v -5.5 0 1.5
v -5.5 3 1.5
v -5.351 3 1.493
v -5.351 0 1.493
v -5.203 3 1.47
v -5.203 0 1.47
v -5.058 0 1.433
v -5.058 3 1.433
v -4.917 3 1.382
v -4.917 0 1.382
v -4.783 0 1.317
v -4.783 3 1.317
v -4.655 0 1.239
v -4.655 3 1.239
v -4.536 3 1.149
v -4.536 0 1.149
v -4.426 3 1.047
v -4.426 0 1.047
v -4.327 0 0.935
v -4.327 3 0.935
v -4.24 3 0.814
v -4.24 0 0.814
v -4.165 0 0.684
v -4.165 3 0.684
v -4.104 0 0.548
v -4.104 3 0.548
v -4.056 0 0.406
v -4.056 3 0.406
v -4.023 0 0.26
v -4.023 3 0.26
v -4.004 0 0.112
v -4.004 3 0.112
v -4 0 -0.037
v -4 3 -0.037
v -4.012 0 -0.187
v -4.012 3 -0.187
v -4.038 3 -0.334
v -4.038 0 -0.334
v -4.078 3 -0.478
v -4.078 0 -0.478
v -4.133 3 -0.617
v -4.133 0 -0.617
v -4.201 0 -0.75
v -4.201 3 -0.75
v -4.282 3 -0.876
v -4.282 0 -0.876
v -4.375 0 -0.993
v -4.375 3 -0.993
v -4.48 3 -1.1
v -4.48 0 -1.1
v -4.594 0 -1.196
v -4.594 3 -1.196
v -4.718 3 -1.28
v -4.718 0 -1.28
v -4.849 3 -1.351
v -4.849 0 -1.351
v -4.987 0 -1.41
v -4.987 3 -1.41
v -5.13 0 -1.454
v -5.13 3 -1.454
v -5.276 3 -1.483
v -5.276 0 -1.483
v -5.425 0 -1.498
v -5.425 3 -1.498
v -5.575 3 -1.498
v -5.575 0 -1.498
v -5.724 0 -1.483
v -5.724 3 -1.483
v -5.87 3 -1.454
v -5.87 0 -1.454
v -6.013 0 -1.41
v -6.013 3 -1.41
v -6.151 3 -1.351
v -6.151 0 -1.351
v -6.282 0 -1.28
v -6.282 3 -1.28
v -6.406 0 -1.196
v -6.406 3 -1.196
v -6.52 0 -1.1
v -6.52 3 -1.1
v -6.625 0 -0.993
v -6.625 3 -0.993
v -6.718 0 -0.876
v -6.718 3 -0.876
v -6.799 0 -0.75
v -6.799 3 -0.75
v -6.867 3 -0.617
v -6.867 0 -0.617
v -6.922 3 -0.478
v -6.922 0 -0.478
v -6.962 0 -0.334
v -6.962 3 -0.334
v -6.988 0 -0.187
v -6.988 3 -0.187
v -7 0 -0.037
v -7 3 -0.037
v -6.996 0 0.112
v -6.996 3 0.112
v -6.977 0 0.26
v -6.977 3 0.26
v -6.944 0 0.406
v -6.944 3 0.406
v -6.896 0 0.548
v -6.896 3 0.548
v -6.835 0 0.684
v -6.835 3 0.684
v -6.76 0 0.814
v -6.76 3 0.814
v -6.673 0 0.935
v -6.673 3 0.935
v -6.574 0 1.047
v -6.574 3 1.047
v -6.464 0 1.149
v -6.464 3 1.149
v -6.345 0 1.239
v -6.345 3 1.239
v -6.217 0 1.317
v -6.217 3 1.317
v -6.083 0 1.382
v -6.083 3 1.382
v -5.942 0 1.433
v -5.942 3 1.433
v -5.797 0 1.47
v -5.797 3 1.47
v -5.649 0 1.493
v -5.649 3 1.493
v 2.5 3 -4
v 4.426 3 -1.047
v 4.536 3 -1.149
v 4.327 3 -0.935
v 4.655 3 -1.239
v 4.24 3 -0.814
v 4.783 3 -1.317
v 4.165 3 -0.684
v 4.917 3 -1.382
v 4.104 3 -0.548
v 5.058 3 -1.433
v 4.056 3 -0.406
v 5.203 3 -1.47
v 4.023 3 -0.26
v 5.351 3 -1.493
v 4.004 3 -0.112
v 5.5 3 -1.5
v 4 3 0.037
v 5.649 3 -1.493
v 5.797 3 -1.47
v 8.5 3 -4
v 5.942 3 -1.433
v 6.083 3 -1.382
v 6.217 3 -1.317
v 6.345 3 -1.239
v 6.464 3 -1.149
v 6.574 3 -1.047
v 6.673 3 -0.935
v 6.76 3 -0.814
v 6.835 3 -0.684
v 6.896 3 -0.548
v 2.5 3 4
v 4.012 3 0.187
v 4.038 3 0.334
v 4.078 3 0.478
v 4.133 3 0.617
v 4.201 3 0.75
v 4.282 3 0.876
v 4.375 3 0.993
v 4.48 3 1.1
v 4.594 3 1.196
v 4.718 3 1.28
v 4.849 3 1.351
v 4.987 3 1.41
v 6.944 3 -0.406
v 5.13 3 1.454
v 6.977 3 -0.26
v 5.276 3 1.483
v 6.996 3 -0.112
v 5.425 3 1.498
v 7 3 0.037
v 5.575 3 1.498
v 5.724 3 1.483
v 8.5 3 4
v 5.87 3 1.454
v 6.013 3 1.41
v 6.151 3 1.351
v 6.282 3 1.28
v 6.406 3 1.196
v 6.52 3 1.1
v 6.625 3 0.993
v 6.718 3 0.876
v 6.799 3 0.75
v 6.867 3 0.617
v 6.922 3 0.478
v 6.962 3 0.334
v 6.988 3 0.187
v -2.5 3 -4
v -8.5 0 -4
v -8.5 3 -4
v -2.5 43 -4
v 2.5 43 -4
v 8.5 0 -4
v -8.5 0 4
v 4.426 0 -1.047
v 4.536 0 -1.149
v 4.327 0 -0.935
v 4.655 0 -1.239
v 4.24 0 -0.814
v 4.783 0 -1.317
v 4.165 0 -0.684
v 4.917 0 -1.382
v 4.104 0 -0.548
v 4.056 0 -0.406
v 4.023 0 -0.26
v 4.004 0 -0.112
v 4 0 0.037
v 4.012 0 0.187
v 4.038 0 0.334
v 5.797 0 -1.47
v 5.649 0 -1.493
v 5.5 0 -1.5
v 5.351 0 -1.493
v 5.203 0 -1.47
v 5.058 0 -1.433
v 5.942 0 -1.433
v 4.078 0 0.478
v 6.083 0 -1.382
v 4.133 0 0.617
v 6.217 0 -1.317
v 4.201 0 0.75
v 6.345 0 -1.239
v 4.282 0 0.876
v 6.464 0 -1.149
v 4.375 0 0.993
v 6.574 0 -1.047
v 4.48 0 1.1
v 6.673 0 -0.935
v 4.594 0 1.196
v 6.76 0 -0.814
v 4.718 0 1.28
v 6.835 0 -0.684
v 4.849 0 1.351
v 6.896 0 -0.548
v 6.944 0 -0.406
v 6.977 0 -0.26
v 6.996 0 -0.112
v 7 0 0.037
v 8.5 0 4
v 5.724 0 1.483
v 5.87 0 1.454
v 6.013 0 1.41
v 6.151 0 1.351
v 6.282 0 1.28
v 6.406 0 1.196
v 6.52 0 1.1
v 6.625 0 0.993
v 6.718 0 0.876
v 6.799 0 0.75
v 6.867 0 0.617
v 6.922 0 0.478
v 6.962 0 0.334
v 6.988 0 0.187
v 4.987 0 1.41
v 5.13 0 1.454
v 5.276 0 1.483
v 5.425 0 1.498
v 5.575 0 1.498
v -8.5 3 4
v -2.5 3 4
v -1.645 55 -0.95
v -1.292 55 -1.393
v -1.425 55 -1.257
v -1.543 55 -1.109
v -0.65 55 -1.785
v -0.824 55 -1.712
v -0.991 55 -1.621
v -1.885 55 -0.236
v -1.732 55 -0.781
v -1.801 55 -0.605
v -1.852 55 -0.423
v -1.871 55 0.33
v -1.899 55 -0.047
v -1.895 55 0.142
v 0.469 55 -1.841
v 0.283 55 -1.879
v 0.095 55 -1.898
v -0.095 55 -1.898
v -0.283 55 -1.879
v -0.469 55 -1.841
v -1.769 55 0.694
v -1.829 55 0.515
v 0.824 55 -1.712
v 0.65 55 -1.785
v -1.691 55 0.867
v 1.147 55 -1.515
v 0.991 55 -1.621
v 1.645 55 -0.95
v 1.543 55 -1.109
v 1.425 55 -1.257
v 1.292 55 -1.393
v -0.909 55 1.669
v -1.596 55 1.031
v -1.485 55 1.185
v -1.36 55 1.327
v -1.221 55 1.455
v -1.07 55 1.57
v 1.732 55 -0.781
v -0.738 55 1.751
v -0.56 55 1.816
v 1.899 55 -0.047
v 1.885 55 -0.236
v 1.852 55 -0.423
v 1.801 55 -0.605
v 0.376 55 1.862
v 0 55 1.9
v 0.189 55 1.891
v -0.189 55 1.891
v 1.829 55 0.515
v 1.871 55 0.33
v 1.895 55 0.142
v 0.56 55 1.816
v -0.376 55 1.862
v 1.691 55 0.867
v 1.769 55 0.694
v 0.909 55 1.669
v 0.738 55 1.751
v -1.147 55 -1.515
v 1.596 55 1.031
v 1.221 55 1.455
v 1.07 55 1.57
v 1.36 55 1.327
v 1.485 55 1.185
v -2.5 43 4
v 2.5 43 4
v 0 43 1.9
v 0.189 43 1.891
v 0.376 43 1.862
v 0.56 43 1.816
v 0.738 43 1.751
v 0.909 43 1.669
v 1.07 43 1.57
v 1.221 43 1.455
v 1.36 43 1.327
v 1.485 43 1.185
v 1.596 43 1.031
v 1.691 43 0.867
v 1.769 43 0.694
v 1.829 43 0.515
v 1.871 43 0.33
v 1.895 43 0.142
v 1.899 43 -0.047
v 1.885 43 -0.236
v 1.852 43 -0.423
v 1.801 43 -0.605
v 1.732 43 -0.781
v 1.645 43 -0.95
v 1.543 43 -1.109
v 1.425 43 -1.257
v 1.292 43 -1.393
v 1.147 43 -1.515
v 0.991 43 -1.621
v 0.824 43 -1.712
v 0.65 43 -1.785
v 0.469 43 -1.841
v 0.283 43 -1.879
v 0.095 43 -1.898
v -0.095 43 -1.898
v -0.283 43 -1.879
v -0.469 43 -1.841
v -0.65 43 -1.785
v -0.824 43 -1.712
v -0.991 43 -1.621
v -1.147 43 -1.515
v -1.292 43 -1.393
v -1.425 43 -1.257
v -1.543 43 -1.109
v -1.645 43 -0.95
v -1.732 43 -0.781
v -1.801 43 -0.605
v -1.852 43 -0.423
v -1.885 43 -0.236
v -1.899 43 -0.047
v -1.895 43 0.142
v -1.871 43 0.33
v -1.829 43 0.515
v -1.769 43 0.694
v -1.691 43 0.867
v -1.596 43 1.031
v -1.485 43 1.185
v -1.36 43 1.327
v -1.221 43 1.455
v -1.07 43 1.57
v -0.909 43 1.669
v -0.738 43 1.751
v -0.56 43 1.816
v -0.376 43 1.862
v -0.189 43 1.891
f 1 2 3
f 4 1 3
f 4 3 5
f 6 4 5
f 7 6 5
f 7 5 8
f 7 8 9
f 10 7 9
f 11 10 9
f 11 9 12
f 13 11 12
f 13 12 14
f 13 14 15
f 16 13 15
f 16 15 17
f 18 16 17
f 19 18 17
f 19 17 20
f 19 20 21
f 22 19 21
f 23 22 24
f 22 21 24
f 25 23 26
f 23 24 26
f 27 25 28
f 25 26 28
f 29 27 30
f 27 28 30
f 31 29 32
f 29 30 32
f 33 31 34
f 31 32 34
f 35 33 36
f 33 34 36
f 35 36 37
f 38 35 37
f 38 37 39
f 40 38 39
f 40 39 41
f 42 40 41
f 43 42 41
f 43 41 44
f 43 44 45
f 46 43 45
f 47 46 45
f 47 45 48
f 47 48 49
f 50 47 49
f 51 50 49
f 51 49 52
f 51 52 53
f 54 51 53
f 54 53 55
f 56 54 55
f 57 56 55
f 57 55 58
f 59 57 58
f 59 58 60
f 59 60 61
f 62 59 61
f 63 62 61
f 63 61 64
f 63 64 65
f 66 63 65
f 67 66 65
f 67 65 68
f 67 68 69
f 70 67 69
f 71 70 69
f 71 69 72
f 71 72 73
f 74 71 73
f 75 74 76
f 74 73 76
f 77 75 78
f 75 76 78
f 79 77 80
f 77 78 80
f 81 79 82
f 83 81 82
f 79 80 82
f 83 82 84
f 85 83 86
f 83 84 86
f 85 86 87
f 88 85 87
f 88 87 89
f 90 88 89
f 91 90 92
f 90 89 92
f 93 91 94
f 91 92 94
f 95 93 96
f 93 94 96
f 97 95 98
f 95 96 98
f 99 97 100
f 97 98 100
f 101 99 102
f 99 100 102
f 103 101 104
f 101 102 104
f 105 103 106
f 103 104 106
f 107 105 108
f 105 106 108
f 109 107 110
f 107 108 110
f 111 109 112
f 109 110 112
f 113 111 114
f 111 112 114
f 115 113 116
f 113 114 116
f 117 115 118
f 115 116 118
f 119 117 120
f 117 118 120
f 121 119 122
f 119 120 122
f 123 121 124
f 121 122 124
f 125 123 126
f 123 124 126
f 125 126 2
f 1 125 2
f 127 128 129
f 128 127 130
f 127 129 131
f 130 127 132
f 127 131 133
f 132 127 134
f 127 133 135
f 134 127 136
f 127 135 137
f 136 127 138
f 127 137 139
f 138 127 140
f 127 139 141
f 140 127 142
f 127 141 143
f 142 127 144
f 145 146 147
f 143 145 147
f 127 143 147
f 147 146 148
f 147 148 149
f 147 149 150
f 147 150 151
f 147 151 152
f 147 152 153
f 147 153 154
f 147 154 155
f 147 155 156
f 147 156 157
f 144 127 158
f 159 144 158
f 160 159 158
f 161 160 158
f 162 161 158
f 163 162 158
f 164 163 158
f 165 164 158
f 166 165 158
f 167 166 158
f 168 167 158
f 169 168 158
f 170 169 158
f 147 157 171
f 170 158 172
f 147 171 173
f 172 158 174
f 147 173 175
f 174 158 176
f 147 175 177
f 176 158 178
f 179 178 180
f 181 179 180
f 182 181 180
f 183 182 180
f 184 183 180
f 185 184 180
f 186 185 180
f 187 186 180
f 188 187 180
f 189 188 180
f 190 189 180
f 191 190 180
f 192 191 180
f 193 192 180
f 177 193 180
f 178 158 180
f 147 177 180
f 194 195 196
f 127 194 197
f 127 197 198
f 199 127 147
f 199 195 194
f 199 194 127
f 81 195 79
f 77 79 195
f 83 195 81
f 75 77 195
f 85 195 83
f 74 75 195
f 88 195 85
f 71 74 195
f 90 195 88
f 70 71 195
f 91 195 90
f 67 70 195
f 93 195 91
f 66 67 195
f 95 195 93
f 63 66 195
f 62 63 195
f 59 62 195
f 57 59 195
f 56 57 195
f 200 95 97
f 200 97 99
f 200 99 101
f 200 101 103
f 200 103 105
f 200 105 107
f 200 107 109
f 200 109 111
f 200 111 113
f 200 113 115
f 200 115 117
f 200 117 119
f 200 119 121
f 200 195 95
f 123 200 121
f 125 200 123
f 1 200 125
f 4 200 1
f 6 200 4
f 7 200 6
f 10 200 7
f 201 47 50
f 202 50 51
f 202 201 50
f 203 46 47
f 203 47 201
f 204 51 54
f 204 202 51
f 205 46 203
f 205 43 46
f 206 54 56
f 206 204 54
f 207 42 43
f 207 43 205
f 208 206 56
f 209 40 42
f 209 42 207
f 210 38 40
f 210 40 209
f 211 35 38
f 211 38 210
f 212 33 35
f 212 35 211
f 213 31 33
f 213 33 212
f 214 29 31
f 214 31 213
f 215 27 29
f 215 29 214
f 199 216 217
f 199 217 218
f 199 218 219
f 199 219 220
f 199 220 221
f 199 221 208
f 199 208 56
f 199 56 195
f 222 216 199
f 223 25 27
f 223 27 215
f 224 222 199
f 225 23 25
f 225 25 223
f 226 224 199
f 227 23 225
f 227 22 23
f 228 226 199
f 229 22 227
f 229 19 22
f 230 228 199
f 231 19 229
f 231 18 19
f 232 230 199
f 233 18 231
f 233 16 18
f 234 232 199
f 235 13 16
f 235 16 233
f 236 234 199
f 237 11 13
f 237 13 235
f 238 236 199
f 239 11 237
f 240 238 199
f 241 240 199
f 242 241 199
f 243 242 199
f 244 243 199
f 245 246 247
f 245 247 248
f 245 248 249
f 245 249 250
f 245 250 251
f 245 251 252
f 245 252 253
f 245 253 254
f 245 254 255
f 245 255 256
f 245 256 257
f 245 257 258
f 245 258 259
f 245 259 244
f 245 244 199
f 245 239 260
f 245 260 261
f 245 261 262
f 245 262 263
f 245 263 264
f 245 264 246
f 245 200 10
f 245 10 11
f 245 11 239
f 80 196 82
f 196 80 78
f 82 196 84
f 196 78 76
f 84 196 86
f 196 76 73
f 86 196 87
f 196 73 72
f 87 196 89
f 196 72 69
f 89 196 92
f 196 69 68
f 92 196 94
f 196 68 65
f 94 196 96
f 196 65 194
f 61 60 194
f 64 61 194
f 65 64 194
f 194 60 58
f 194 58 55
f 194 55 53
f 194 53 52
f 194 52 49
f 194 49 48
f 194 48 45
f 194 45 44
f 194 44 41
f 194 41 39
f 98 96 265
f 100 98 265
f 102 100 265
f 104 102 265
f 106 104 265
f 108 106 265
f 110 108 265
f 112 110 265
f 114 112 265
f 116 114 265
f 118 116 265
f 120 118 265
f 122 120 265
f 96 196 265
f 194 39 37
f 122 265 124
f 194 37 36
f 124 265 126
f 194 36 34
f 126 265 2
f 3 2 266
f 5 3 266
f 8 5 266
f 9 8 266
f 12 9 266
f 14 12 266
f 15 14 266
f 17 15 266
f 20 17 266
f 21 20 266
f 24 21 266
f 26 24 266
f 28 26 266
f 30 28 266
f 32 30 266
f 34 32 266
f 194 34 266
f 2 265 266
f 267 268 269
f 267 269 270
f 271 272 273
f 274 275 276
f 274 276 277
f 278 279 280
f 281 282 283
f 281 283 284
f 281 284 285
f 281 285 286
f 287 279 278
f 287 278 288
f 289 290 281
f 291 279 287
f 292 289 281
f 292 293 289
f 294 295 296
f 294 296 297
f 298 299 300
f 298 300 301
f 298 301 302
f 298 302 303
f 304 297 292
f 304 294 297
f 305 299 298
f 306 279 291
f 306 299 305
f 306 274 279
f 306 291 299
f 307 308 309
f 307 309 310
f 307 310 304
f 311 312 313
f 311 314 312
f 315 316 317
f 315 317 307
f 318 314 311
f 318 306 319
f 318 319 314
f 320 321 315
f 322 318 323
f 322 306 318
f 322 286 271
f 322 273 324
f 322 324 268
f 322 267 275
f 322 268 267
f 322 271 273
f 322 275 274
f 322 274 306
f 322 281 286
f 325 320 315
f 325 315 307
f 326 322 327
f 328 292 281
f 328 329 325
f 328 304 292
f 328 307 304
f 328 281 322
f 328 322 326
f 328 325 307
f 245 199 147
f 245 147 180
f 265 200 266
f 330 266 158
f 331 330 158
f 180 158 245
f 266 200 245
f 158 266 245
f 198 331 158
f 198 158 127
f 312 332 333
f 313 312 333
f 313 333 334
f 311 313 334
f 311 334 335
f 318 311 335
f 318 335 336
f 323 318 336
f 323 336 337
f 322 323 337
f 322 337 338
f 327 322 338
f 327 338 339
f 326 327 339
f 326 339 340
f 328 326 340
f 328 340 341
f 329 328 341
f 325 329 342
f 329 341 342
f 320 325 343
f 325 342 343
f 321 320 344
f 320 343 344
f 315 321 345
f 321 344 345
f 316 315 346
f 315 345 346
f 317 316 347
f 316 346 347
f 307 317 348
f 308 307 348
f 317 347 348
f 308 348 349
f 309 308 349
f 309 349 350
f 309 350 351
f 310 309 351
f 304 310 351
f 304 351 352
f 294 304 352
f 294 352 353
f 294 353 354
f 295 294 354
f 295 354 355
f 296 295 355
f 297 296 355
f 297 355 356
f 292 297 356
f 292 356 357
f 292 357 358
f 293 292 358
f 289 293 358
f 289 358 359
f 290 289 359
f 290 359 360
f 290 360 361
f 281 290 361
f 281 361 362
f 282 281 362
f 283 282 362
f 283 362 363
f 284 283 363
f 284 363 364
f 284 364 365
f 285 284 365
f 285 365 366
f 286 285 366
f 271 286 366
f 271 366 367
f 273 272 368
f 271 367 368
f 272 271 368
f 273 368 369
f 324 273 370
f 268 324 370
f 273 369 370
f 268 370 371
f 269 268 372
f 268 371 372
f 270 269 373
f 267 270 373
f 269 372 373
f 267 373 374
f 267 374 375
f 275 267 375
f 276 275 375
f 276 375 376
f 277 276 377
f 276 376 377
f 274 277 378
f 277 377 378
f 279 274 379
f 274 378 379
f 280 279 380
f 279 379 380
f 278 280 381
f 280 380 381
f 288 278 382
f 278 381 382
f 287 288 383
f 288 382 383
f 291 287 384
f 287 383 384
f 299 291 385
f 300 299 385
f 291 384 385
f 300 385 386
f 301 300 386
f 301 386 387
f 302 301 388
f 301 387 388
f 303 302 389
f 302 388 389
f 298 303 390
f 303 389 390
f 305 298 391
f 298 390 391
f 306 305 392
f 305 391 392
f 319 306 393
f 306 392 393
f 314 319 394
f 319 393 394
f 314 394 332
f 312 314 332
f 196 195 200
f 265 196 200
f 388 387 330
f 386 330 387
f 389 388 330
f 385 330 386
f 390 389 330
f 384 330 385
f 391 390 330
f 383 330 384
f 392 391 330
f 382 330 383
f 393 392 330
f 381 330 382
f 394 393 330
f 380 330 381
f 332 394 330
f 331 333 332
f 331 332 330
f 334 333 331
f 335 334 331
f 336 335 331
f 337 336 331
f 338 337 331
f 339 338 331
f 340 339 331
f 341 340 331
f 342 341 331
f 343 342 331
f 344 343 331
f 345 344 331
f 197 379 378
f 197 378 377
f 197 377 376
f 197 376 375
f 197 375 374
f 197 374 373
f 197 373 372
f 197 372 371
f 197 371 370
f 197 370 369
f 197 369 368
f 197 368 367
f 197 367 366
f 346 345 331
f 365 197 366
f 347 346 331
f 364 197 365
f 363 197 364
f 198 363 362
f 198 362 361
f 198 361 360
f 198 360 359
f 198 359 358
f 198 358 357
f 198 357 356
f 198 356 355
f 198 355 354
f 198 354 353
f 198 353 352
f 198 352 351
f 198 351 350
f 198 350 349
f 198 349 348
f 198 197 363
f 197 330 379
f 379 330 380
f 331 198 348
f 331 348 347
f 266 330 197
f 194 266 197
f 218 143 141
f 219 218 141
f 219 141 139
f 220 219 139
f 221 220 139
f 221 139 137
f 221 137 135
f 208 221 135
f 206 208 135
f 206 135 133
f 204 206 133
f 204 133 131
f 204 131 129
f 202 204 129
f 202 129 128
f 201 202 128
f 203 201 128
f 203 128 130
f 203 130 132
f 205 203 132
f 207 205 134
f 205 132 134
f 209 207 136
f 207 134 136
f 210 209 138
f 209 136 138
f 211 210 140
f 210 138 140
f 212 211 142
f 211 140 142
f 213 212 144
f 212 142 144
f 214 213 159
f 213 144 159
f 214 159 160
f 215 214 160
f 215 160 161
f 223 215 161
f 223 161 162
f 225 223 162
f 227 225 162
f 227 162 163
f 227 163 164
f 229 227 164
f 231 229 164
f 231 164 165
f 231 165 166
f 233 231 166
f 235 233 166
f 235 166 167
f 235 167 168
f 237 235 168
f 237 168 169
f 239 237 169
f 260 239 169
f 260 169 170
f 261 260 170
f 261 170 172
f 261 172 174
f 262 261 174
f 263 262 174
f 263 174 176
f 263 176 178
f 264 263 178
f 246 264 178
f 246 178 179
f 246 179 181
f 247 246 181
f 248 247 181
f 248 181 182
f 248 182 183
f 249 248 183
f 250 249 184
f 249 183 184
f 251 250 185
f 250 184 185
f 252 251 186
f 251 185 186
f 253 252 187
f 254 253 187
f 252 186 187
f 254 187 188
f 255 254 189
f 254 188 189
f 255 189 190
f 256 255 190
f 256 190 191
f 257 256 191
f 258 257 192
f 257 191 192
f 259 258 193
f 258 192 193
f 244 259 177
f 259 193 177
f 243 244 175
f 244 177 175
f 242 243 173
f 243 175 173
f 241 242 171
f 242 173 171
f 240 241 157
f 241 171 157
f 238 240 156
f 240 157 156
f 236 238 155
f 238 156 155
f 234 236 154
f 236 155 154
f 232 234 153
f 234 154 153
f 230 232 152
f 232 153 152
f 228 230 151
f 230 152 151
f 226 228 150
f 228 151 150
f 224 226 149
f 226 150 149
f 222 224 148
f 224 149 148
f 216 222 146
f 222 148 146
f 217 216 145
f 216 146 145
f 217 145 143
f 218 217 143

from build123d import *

# Parameters (mm, degrees)
SKETCH1_R           = 1.9
BOSS_EXTRUDE1_DEPTH = 55
SKETCH2_W           = 17
SKETCH2_H           = 8
BOSS_EXTRUDE2_DEPTH = 3
SKETCH3_R           = 1.5
CUT_EXTRUDE1_DEPTH  = 53.841744861
SKETCH4_W           = 5
SKETCH4_H           = 8
BOSS_EXTRUDE3_DEPTH = 40


with BuildPart() as part:
    # Sketch1 → Boss-Extrude1 (new body)
    with BuildSketch(Plane(origin=(0, 0, 0), x_dir=(1, 0, 0), z_dir=(0, 1, 0))):
        with Locations(Location((0, 0, 0), (0, 0, 270))):
            Circle(SKETCH1_R)
    extrude(amount=BOSS_EXTRUDE1_DEPTH)

    # Sketch2 → Boss-Extrude2 (add)
    with BuildSketch(Plane.XZ):
        Rectangle(SKETCH2_W, SKETCH2_H)
    extrude(amount=-BOSS_EXTRUDE2_DEPTH)

    # Sketch3 → Cut-Extrude1 (cut, through all)
    with BuildSketch(Plane(origin=(0, 3, 0), x_dir=(1, 0, 0), z_dir=(0, 1, 0))):
        with Locations(Location((-5.5, 0, 0), (0, 0, 270))):
            Circle(SKETCH3_R)
        with Locations(Location((5.5, 0, 0), (0, 0, 90))):
            Circle(SKETCH3_R)
    extrude(amount=-CUT_EXTRUDE1_DEPTH, mode=Mode.SUBTRACT)

    # Sketch4 → Boss-Extrude3 (add)
    with BuildSketch(Plane(origin=(0, 3, 0), x_dir=(1, 0, 0), z_dir=(0, 1, 0))):
        Rectangle(SKETCH4_W, SKETCH4_H)
    extrude(amount=BOSS_EXTRUDE3_DEPTH)


solid = part.part
